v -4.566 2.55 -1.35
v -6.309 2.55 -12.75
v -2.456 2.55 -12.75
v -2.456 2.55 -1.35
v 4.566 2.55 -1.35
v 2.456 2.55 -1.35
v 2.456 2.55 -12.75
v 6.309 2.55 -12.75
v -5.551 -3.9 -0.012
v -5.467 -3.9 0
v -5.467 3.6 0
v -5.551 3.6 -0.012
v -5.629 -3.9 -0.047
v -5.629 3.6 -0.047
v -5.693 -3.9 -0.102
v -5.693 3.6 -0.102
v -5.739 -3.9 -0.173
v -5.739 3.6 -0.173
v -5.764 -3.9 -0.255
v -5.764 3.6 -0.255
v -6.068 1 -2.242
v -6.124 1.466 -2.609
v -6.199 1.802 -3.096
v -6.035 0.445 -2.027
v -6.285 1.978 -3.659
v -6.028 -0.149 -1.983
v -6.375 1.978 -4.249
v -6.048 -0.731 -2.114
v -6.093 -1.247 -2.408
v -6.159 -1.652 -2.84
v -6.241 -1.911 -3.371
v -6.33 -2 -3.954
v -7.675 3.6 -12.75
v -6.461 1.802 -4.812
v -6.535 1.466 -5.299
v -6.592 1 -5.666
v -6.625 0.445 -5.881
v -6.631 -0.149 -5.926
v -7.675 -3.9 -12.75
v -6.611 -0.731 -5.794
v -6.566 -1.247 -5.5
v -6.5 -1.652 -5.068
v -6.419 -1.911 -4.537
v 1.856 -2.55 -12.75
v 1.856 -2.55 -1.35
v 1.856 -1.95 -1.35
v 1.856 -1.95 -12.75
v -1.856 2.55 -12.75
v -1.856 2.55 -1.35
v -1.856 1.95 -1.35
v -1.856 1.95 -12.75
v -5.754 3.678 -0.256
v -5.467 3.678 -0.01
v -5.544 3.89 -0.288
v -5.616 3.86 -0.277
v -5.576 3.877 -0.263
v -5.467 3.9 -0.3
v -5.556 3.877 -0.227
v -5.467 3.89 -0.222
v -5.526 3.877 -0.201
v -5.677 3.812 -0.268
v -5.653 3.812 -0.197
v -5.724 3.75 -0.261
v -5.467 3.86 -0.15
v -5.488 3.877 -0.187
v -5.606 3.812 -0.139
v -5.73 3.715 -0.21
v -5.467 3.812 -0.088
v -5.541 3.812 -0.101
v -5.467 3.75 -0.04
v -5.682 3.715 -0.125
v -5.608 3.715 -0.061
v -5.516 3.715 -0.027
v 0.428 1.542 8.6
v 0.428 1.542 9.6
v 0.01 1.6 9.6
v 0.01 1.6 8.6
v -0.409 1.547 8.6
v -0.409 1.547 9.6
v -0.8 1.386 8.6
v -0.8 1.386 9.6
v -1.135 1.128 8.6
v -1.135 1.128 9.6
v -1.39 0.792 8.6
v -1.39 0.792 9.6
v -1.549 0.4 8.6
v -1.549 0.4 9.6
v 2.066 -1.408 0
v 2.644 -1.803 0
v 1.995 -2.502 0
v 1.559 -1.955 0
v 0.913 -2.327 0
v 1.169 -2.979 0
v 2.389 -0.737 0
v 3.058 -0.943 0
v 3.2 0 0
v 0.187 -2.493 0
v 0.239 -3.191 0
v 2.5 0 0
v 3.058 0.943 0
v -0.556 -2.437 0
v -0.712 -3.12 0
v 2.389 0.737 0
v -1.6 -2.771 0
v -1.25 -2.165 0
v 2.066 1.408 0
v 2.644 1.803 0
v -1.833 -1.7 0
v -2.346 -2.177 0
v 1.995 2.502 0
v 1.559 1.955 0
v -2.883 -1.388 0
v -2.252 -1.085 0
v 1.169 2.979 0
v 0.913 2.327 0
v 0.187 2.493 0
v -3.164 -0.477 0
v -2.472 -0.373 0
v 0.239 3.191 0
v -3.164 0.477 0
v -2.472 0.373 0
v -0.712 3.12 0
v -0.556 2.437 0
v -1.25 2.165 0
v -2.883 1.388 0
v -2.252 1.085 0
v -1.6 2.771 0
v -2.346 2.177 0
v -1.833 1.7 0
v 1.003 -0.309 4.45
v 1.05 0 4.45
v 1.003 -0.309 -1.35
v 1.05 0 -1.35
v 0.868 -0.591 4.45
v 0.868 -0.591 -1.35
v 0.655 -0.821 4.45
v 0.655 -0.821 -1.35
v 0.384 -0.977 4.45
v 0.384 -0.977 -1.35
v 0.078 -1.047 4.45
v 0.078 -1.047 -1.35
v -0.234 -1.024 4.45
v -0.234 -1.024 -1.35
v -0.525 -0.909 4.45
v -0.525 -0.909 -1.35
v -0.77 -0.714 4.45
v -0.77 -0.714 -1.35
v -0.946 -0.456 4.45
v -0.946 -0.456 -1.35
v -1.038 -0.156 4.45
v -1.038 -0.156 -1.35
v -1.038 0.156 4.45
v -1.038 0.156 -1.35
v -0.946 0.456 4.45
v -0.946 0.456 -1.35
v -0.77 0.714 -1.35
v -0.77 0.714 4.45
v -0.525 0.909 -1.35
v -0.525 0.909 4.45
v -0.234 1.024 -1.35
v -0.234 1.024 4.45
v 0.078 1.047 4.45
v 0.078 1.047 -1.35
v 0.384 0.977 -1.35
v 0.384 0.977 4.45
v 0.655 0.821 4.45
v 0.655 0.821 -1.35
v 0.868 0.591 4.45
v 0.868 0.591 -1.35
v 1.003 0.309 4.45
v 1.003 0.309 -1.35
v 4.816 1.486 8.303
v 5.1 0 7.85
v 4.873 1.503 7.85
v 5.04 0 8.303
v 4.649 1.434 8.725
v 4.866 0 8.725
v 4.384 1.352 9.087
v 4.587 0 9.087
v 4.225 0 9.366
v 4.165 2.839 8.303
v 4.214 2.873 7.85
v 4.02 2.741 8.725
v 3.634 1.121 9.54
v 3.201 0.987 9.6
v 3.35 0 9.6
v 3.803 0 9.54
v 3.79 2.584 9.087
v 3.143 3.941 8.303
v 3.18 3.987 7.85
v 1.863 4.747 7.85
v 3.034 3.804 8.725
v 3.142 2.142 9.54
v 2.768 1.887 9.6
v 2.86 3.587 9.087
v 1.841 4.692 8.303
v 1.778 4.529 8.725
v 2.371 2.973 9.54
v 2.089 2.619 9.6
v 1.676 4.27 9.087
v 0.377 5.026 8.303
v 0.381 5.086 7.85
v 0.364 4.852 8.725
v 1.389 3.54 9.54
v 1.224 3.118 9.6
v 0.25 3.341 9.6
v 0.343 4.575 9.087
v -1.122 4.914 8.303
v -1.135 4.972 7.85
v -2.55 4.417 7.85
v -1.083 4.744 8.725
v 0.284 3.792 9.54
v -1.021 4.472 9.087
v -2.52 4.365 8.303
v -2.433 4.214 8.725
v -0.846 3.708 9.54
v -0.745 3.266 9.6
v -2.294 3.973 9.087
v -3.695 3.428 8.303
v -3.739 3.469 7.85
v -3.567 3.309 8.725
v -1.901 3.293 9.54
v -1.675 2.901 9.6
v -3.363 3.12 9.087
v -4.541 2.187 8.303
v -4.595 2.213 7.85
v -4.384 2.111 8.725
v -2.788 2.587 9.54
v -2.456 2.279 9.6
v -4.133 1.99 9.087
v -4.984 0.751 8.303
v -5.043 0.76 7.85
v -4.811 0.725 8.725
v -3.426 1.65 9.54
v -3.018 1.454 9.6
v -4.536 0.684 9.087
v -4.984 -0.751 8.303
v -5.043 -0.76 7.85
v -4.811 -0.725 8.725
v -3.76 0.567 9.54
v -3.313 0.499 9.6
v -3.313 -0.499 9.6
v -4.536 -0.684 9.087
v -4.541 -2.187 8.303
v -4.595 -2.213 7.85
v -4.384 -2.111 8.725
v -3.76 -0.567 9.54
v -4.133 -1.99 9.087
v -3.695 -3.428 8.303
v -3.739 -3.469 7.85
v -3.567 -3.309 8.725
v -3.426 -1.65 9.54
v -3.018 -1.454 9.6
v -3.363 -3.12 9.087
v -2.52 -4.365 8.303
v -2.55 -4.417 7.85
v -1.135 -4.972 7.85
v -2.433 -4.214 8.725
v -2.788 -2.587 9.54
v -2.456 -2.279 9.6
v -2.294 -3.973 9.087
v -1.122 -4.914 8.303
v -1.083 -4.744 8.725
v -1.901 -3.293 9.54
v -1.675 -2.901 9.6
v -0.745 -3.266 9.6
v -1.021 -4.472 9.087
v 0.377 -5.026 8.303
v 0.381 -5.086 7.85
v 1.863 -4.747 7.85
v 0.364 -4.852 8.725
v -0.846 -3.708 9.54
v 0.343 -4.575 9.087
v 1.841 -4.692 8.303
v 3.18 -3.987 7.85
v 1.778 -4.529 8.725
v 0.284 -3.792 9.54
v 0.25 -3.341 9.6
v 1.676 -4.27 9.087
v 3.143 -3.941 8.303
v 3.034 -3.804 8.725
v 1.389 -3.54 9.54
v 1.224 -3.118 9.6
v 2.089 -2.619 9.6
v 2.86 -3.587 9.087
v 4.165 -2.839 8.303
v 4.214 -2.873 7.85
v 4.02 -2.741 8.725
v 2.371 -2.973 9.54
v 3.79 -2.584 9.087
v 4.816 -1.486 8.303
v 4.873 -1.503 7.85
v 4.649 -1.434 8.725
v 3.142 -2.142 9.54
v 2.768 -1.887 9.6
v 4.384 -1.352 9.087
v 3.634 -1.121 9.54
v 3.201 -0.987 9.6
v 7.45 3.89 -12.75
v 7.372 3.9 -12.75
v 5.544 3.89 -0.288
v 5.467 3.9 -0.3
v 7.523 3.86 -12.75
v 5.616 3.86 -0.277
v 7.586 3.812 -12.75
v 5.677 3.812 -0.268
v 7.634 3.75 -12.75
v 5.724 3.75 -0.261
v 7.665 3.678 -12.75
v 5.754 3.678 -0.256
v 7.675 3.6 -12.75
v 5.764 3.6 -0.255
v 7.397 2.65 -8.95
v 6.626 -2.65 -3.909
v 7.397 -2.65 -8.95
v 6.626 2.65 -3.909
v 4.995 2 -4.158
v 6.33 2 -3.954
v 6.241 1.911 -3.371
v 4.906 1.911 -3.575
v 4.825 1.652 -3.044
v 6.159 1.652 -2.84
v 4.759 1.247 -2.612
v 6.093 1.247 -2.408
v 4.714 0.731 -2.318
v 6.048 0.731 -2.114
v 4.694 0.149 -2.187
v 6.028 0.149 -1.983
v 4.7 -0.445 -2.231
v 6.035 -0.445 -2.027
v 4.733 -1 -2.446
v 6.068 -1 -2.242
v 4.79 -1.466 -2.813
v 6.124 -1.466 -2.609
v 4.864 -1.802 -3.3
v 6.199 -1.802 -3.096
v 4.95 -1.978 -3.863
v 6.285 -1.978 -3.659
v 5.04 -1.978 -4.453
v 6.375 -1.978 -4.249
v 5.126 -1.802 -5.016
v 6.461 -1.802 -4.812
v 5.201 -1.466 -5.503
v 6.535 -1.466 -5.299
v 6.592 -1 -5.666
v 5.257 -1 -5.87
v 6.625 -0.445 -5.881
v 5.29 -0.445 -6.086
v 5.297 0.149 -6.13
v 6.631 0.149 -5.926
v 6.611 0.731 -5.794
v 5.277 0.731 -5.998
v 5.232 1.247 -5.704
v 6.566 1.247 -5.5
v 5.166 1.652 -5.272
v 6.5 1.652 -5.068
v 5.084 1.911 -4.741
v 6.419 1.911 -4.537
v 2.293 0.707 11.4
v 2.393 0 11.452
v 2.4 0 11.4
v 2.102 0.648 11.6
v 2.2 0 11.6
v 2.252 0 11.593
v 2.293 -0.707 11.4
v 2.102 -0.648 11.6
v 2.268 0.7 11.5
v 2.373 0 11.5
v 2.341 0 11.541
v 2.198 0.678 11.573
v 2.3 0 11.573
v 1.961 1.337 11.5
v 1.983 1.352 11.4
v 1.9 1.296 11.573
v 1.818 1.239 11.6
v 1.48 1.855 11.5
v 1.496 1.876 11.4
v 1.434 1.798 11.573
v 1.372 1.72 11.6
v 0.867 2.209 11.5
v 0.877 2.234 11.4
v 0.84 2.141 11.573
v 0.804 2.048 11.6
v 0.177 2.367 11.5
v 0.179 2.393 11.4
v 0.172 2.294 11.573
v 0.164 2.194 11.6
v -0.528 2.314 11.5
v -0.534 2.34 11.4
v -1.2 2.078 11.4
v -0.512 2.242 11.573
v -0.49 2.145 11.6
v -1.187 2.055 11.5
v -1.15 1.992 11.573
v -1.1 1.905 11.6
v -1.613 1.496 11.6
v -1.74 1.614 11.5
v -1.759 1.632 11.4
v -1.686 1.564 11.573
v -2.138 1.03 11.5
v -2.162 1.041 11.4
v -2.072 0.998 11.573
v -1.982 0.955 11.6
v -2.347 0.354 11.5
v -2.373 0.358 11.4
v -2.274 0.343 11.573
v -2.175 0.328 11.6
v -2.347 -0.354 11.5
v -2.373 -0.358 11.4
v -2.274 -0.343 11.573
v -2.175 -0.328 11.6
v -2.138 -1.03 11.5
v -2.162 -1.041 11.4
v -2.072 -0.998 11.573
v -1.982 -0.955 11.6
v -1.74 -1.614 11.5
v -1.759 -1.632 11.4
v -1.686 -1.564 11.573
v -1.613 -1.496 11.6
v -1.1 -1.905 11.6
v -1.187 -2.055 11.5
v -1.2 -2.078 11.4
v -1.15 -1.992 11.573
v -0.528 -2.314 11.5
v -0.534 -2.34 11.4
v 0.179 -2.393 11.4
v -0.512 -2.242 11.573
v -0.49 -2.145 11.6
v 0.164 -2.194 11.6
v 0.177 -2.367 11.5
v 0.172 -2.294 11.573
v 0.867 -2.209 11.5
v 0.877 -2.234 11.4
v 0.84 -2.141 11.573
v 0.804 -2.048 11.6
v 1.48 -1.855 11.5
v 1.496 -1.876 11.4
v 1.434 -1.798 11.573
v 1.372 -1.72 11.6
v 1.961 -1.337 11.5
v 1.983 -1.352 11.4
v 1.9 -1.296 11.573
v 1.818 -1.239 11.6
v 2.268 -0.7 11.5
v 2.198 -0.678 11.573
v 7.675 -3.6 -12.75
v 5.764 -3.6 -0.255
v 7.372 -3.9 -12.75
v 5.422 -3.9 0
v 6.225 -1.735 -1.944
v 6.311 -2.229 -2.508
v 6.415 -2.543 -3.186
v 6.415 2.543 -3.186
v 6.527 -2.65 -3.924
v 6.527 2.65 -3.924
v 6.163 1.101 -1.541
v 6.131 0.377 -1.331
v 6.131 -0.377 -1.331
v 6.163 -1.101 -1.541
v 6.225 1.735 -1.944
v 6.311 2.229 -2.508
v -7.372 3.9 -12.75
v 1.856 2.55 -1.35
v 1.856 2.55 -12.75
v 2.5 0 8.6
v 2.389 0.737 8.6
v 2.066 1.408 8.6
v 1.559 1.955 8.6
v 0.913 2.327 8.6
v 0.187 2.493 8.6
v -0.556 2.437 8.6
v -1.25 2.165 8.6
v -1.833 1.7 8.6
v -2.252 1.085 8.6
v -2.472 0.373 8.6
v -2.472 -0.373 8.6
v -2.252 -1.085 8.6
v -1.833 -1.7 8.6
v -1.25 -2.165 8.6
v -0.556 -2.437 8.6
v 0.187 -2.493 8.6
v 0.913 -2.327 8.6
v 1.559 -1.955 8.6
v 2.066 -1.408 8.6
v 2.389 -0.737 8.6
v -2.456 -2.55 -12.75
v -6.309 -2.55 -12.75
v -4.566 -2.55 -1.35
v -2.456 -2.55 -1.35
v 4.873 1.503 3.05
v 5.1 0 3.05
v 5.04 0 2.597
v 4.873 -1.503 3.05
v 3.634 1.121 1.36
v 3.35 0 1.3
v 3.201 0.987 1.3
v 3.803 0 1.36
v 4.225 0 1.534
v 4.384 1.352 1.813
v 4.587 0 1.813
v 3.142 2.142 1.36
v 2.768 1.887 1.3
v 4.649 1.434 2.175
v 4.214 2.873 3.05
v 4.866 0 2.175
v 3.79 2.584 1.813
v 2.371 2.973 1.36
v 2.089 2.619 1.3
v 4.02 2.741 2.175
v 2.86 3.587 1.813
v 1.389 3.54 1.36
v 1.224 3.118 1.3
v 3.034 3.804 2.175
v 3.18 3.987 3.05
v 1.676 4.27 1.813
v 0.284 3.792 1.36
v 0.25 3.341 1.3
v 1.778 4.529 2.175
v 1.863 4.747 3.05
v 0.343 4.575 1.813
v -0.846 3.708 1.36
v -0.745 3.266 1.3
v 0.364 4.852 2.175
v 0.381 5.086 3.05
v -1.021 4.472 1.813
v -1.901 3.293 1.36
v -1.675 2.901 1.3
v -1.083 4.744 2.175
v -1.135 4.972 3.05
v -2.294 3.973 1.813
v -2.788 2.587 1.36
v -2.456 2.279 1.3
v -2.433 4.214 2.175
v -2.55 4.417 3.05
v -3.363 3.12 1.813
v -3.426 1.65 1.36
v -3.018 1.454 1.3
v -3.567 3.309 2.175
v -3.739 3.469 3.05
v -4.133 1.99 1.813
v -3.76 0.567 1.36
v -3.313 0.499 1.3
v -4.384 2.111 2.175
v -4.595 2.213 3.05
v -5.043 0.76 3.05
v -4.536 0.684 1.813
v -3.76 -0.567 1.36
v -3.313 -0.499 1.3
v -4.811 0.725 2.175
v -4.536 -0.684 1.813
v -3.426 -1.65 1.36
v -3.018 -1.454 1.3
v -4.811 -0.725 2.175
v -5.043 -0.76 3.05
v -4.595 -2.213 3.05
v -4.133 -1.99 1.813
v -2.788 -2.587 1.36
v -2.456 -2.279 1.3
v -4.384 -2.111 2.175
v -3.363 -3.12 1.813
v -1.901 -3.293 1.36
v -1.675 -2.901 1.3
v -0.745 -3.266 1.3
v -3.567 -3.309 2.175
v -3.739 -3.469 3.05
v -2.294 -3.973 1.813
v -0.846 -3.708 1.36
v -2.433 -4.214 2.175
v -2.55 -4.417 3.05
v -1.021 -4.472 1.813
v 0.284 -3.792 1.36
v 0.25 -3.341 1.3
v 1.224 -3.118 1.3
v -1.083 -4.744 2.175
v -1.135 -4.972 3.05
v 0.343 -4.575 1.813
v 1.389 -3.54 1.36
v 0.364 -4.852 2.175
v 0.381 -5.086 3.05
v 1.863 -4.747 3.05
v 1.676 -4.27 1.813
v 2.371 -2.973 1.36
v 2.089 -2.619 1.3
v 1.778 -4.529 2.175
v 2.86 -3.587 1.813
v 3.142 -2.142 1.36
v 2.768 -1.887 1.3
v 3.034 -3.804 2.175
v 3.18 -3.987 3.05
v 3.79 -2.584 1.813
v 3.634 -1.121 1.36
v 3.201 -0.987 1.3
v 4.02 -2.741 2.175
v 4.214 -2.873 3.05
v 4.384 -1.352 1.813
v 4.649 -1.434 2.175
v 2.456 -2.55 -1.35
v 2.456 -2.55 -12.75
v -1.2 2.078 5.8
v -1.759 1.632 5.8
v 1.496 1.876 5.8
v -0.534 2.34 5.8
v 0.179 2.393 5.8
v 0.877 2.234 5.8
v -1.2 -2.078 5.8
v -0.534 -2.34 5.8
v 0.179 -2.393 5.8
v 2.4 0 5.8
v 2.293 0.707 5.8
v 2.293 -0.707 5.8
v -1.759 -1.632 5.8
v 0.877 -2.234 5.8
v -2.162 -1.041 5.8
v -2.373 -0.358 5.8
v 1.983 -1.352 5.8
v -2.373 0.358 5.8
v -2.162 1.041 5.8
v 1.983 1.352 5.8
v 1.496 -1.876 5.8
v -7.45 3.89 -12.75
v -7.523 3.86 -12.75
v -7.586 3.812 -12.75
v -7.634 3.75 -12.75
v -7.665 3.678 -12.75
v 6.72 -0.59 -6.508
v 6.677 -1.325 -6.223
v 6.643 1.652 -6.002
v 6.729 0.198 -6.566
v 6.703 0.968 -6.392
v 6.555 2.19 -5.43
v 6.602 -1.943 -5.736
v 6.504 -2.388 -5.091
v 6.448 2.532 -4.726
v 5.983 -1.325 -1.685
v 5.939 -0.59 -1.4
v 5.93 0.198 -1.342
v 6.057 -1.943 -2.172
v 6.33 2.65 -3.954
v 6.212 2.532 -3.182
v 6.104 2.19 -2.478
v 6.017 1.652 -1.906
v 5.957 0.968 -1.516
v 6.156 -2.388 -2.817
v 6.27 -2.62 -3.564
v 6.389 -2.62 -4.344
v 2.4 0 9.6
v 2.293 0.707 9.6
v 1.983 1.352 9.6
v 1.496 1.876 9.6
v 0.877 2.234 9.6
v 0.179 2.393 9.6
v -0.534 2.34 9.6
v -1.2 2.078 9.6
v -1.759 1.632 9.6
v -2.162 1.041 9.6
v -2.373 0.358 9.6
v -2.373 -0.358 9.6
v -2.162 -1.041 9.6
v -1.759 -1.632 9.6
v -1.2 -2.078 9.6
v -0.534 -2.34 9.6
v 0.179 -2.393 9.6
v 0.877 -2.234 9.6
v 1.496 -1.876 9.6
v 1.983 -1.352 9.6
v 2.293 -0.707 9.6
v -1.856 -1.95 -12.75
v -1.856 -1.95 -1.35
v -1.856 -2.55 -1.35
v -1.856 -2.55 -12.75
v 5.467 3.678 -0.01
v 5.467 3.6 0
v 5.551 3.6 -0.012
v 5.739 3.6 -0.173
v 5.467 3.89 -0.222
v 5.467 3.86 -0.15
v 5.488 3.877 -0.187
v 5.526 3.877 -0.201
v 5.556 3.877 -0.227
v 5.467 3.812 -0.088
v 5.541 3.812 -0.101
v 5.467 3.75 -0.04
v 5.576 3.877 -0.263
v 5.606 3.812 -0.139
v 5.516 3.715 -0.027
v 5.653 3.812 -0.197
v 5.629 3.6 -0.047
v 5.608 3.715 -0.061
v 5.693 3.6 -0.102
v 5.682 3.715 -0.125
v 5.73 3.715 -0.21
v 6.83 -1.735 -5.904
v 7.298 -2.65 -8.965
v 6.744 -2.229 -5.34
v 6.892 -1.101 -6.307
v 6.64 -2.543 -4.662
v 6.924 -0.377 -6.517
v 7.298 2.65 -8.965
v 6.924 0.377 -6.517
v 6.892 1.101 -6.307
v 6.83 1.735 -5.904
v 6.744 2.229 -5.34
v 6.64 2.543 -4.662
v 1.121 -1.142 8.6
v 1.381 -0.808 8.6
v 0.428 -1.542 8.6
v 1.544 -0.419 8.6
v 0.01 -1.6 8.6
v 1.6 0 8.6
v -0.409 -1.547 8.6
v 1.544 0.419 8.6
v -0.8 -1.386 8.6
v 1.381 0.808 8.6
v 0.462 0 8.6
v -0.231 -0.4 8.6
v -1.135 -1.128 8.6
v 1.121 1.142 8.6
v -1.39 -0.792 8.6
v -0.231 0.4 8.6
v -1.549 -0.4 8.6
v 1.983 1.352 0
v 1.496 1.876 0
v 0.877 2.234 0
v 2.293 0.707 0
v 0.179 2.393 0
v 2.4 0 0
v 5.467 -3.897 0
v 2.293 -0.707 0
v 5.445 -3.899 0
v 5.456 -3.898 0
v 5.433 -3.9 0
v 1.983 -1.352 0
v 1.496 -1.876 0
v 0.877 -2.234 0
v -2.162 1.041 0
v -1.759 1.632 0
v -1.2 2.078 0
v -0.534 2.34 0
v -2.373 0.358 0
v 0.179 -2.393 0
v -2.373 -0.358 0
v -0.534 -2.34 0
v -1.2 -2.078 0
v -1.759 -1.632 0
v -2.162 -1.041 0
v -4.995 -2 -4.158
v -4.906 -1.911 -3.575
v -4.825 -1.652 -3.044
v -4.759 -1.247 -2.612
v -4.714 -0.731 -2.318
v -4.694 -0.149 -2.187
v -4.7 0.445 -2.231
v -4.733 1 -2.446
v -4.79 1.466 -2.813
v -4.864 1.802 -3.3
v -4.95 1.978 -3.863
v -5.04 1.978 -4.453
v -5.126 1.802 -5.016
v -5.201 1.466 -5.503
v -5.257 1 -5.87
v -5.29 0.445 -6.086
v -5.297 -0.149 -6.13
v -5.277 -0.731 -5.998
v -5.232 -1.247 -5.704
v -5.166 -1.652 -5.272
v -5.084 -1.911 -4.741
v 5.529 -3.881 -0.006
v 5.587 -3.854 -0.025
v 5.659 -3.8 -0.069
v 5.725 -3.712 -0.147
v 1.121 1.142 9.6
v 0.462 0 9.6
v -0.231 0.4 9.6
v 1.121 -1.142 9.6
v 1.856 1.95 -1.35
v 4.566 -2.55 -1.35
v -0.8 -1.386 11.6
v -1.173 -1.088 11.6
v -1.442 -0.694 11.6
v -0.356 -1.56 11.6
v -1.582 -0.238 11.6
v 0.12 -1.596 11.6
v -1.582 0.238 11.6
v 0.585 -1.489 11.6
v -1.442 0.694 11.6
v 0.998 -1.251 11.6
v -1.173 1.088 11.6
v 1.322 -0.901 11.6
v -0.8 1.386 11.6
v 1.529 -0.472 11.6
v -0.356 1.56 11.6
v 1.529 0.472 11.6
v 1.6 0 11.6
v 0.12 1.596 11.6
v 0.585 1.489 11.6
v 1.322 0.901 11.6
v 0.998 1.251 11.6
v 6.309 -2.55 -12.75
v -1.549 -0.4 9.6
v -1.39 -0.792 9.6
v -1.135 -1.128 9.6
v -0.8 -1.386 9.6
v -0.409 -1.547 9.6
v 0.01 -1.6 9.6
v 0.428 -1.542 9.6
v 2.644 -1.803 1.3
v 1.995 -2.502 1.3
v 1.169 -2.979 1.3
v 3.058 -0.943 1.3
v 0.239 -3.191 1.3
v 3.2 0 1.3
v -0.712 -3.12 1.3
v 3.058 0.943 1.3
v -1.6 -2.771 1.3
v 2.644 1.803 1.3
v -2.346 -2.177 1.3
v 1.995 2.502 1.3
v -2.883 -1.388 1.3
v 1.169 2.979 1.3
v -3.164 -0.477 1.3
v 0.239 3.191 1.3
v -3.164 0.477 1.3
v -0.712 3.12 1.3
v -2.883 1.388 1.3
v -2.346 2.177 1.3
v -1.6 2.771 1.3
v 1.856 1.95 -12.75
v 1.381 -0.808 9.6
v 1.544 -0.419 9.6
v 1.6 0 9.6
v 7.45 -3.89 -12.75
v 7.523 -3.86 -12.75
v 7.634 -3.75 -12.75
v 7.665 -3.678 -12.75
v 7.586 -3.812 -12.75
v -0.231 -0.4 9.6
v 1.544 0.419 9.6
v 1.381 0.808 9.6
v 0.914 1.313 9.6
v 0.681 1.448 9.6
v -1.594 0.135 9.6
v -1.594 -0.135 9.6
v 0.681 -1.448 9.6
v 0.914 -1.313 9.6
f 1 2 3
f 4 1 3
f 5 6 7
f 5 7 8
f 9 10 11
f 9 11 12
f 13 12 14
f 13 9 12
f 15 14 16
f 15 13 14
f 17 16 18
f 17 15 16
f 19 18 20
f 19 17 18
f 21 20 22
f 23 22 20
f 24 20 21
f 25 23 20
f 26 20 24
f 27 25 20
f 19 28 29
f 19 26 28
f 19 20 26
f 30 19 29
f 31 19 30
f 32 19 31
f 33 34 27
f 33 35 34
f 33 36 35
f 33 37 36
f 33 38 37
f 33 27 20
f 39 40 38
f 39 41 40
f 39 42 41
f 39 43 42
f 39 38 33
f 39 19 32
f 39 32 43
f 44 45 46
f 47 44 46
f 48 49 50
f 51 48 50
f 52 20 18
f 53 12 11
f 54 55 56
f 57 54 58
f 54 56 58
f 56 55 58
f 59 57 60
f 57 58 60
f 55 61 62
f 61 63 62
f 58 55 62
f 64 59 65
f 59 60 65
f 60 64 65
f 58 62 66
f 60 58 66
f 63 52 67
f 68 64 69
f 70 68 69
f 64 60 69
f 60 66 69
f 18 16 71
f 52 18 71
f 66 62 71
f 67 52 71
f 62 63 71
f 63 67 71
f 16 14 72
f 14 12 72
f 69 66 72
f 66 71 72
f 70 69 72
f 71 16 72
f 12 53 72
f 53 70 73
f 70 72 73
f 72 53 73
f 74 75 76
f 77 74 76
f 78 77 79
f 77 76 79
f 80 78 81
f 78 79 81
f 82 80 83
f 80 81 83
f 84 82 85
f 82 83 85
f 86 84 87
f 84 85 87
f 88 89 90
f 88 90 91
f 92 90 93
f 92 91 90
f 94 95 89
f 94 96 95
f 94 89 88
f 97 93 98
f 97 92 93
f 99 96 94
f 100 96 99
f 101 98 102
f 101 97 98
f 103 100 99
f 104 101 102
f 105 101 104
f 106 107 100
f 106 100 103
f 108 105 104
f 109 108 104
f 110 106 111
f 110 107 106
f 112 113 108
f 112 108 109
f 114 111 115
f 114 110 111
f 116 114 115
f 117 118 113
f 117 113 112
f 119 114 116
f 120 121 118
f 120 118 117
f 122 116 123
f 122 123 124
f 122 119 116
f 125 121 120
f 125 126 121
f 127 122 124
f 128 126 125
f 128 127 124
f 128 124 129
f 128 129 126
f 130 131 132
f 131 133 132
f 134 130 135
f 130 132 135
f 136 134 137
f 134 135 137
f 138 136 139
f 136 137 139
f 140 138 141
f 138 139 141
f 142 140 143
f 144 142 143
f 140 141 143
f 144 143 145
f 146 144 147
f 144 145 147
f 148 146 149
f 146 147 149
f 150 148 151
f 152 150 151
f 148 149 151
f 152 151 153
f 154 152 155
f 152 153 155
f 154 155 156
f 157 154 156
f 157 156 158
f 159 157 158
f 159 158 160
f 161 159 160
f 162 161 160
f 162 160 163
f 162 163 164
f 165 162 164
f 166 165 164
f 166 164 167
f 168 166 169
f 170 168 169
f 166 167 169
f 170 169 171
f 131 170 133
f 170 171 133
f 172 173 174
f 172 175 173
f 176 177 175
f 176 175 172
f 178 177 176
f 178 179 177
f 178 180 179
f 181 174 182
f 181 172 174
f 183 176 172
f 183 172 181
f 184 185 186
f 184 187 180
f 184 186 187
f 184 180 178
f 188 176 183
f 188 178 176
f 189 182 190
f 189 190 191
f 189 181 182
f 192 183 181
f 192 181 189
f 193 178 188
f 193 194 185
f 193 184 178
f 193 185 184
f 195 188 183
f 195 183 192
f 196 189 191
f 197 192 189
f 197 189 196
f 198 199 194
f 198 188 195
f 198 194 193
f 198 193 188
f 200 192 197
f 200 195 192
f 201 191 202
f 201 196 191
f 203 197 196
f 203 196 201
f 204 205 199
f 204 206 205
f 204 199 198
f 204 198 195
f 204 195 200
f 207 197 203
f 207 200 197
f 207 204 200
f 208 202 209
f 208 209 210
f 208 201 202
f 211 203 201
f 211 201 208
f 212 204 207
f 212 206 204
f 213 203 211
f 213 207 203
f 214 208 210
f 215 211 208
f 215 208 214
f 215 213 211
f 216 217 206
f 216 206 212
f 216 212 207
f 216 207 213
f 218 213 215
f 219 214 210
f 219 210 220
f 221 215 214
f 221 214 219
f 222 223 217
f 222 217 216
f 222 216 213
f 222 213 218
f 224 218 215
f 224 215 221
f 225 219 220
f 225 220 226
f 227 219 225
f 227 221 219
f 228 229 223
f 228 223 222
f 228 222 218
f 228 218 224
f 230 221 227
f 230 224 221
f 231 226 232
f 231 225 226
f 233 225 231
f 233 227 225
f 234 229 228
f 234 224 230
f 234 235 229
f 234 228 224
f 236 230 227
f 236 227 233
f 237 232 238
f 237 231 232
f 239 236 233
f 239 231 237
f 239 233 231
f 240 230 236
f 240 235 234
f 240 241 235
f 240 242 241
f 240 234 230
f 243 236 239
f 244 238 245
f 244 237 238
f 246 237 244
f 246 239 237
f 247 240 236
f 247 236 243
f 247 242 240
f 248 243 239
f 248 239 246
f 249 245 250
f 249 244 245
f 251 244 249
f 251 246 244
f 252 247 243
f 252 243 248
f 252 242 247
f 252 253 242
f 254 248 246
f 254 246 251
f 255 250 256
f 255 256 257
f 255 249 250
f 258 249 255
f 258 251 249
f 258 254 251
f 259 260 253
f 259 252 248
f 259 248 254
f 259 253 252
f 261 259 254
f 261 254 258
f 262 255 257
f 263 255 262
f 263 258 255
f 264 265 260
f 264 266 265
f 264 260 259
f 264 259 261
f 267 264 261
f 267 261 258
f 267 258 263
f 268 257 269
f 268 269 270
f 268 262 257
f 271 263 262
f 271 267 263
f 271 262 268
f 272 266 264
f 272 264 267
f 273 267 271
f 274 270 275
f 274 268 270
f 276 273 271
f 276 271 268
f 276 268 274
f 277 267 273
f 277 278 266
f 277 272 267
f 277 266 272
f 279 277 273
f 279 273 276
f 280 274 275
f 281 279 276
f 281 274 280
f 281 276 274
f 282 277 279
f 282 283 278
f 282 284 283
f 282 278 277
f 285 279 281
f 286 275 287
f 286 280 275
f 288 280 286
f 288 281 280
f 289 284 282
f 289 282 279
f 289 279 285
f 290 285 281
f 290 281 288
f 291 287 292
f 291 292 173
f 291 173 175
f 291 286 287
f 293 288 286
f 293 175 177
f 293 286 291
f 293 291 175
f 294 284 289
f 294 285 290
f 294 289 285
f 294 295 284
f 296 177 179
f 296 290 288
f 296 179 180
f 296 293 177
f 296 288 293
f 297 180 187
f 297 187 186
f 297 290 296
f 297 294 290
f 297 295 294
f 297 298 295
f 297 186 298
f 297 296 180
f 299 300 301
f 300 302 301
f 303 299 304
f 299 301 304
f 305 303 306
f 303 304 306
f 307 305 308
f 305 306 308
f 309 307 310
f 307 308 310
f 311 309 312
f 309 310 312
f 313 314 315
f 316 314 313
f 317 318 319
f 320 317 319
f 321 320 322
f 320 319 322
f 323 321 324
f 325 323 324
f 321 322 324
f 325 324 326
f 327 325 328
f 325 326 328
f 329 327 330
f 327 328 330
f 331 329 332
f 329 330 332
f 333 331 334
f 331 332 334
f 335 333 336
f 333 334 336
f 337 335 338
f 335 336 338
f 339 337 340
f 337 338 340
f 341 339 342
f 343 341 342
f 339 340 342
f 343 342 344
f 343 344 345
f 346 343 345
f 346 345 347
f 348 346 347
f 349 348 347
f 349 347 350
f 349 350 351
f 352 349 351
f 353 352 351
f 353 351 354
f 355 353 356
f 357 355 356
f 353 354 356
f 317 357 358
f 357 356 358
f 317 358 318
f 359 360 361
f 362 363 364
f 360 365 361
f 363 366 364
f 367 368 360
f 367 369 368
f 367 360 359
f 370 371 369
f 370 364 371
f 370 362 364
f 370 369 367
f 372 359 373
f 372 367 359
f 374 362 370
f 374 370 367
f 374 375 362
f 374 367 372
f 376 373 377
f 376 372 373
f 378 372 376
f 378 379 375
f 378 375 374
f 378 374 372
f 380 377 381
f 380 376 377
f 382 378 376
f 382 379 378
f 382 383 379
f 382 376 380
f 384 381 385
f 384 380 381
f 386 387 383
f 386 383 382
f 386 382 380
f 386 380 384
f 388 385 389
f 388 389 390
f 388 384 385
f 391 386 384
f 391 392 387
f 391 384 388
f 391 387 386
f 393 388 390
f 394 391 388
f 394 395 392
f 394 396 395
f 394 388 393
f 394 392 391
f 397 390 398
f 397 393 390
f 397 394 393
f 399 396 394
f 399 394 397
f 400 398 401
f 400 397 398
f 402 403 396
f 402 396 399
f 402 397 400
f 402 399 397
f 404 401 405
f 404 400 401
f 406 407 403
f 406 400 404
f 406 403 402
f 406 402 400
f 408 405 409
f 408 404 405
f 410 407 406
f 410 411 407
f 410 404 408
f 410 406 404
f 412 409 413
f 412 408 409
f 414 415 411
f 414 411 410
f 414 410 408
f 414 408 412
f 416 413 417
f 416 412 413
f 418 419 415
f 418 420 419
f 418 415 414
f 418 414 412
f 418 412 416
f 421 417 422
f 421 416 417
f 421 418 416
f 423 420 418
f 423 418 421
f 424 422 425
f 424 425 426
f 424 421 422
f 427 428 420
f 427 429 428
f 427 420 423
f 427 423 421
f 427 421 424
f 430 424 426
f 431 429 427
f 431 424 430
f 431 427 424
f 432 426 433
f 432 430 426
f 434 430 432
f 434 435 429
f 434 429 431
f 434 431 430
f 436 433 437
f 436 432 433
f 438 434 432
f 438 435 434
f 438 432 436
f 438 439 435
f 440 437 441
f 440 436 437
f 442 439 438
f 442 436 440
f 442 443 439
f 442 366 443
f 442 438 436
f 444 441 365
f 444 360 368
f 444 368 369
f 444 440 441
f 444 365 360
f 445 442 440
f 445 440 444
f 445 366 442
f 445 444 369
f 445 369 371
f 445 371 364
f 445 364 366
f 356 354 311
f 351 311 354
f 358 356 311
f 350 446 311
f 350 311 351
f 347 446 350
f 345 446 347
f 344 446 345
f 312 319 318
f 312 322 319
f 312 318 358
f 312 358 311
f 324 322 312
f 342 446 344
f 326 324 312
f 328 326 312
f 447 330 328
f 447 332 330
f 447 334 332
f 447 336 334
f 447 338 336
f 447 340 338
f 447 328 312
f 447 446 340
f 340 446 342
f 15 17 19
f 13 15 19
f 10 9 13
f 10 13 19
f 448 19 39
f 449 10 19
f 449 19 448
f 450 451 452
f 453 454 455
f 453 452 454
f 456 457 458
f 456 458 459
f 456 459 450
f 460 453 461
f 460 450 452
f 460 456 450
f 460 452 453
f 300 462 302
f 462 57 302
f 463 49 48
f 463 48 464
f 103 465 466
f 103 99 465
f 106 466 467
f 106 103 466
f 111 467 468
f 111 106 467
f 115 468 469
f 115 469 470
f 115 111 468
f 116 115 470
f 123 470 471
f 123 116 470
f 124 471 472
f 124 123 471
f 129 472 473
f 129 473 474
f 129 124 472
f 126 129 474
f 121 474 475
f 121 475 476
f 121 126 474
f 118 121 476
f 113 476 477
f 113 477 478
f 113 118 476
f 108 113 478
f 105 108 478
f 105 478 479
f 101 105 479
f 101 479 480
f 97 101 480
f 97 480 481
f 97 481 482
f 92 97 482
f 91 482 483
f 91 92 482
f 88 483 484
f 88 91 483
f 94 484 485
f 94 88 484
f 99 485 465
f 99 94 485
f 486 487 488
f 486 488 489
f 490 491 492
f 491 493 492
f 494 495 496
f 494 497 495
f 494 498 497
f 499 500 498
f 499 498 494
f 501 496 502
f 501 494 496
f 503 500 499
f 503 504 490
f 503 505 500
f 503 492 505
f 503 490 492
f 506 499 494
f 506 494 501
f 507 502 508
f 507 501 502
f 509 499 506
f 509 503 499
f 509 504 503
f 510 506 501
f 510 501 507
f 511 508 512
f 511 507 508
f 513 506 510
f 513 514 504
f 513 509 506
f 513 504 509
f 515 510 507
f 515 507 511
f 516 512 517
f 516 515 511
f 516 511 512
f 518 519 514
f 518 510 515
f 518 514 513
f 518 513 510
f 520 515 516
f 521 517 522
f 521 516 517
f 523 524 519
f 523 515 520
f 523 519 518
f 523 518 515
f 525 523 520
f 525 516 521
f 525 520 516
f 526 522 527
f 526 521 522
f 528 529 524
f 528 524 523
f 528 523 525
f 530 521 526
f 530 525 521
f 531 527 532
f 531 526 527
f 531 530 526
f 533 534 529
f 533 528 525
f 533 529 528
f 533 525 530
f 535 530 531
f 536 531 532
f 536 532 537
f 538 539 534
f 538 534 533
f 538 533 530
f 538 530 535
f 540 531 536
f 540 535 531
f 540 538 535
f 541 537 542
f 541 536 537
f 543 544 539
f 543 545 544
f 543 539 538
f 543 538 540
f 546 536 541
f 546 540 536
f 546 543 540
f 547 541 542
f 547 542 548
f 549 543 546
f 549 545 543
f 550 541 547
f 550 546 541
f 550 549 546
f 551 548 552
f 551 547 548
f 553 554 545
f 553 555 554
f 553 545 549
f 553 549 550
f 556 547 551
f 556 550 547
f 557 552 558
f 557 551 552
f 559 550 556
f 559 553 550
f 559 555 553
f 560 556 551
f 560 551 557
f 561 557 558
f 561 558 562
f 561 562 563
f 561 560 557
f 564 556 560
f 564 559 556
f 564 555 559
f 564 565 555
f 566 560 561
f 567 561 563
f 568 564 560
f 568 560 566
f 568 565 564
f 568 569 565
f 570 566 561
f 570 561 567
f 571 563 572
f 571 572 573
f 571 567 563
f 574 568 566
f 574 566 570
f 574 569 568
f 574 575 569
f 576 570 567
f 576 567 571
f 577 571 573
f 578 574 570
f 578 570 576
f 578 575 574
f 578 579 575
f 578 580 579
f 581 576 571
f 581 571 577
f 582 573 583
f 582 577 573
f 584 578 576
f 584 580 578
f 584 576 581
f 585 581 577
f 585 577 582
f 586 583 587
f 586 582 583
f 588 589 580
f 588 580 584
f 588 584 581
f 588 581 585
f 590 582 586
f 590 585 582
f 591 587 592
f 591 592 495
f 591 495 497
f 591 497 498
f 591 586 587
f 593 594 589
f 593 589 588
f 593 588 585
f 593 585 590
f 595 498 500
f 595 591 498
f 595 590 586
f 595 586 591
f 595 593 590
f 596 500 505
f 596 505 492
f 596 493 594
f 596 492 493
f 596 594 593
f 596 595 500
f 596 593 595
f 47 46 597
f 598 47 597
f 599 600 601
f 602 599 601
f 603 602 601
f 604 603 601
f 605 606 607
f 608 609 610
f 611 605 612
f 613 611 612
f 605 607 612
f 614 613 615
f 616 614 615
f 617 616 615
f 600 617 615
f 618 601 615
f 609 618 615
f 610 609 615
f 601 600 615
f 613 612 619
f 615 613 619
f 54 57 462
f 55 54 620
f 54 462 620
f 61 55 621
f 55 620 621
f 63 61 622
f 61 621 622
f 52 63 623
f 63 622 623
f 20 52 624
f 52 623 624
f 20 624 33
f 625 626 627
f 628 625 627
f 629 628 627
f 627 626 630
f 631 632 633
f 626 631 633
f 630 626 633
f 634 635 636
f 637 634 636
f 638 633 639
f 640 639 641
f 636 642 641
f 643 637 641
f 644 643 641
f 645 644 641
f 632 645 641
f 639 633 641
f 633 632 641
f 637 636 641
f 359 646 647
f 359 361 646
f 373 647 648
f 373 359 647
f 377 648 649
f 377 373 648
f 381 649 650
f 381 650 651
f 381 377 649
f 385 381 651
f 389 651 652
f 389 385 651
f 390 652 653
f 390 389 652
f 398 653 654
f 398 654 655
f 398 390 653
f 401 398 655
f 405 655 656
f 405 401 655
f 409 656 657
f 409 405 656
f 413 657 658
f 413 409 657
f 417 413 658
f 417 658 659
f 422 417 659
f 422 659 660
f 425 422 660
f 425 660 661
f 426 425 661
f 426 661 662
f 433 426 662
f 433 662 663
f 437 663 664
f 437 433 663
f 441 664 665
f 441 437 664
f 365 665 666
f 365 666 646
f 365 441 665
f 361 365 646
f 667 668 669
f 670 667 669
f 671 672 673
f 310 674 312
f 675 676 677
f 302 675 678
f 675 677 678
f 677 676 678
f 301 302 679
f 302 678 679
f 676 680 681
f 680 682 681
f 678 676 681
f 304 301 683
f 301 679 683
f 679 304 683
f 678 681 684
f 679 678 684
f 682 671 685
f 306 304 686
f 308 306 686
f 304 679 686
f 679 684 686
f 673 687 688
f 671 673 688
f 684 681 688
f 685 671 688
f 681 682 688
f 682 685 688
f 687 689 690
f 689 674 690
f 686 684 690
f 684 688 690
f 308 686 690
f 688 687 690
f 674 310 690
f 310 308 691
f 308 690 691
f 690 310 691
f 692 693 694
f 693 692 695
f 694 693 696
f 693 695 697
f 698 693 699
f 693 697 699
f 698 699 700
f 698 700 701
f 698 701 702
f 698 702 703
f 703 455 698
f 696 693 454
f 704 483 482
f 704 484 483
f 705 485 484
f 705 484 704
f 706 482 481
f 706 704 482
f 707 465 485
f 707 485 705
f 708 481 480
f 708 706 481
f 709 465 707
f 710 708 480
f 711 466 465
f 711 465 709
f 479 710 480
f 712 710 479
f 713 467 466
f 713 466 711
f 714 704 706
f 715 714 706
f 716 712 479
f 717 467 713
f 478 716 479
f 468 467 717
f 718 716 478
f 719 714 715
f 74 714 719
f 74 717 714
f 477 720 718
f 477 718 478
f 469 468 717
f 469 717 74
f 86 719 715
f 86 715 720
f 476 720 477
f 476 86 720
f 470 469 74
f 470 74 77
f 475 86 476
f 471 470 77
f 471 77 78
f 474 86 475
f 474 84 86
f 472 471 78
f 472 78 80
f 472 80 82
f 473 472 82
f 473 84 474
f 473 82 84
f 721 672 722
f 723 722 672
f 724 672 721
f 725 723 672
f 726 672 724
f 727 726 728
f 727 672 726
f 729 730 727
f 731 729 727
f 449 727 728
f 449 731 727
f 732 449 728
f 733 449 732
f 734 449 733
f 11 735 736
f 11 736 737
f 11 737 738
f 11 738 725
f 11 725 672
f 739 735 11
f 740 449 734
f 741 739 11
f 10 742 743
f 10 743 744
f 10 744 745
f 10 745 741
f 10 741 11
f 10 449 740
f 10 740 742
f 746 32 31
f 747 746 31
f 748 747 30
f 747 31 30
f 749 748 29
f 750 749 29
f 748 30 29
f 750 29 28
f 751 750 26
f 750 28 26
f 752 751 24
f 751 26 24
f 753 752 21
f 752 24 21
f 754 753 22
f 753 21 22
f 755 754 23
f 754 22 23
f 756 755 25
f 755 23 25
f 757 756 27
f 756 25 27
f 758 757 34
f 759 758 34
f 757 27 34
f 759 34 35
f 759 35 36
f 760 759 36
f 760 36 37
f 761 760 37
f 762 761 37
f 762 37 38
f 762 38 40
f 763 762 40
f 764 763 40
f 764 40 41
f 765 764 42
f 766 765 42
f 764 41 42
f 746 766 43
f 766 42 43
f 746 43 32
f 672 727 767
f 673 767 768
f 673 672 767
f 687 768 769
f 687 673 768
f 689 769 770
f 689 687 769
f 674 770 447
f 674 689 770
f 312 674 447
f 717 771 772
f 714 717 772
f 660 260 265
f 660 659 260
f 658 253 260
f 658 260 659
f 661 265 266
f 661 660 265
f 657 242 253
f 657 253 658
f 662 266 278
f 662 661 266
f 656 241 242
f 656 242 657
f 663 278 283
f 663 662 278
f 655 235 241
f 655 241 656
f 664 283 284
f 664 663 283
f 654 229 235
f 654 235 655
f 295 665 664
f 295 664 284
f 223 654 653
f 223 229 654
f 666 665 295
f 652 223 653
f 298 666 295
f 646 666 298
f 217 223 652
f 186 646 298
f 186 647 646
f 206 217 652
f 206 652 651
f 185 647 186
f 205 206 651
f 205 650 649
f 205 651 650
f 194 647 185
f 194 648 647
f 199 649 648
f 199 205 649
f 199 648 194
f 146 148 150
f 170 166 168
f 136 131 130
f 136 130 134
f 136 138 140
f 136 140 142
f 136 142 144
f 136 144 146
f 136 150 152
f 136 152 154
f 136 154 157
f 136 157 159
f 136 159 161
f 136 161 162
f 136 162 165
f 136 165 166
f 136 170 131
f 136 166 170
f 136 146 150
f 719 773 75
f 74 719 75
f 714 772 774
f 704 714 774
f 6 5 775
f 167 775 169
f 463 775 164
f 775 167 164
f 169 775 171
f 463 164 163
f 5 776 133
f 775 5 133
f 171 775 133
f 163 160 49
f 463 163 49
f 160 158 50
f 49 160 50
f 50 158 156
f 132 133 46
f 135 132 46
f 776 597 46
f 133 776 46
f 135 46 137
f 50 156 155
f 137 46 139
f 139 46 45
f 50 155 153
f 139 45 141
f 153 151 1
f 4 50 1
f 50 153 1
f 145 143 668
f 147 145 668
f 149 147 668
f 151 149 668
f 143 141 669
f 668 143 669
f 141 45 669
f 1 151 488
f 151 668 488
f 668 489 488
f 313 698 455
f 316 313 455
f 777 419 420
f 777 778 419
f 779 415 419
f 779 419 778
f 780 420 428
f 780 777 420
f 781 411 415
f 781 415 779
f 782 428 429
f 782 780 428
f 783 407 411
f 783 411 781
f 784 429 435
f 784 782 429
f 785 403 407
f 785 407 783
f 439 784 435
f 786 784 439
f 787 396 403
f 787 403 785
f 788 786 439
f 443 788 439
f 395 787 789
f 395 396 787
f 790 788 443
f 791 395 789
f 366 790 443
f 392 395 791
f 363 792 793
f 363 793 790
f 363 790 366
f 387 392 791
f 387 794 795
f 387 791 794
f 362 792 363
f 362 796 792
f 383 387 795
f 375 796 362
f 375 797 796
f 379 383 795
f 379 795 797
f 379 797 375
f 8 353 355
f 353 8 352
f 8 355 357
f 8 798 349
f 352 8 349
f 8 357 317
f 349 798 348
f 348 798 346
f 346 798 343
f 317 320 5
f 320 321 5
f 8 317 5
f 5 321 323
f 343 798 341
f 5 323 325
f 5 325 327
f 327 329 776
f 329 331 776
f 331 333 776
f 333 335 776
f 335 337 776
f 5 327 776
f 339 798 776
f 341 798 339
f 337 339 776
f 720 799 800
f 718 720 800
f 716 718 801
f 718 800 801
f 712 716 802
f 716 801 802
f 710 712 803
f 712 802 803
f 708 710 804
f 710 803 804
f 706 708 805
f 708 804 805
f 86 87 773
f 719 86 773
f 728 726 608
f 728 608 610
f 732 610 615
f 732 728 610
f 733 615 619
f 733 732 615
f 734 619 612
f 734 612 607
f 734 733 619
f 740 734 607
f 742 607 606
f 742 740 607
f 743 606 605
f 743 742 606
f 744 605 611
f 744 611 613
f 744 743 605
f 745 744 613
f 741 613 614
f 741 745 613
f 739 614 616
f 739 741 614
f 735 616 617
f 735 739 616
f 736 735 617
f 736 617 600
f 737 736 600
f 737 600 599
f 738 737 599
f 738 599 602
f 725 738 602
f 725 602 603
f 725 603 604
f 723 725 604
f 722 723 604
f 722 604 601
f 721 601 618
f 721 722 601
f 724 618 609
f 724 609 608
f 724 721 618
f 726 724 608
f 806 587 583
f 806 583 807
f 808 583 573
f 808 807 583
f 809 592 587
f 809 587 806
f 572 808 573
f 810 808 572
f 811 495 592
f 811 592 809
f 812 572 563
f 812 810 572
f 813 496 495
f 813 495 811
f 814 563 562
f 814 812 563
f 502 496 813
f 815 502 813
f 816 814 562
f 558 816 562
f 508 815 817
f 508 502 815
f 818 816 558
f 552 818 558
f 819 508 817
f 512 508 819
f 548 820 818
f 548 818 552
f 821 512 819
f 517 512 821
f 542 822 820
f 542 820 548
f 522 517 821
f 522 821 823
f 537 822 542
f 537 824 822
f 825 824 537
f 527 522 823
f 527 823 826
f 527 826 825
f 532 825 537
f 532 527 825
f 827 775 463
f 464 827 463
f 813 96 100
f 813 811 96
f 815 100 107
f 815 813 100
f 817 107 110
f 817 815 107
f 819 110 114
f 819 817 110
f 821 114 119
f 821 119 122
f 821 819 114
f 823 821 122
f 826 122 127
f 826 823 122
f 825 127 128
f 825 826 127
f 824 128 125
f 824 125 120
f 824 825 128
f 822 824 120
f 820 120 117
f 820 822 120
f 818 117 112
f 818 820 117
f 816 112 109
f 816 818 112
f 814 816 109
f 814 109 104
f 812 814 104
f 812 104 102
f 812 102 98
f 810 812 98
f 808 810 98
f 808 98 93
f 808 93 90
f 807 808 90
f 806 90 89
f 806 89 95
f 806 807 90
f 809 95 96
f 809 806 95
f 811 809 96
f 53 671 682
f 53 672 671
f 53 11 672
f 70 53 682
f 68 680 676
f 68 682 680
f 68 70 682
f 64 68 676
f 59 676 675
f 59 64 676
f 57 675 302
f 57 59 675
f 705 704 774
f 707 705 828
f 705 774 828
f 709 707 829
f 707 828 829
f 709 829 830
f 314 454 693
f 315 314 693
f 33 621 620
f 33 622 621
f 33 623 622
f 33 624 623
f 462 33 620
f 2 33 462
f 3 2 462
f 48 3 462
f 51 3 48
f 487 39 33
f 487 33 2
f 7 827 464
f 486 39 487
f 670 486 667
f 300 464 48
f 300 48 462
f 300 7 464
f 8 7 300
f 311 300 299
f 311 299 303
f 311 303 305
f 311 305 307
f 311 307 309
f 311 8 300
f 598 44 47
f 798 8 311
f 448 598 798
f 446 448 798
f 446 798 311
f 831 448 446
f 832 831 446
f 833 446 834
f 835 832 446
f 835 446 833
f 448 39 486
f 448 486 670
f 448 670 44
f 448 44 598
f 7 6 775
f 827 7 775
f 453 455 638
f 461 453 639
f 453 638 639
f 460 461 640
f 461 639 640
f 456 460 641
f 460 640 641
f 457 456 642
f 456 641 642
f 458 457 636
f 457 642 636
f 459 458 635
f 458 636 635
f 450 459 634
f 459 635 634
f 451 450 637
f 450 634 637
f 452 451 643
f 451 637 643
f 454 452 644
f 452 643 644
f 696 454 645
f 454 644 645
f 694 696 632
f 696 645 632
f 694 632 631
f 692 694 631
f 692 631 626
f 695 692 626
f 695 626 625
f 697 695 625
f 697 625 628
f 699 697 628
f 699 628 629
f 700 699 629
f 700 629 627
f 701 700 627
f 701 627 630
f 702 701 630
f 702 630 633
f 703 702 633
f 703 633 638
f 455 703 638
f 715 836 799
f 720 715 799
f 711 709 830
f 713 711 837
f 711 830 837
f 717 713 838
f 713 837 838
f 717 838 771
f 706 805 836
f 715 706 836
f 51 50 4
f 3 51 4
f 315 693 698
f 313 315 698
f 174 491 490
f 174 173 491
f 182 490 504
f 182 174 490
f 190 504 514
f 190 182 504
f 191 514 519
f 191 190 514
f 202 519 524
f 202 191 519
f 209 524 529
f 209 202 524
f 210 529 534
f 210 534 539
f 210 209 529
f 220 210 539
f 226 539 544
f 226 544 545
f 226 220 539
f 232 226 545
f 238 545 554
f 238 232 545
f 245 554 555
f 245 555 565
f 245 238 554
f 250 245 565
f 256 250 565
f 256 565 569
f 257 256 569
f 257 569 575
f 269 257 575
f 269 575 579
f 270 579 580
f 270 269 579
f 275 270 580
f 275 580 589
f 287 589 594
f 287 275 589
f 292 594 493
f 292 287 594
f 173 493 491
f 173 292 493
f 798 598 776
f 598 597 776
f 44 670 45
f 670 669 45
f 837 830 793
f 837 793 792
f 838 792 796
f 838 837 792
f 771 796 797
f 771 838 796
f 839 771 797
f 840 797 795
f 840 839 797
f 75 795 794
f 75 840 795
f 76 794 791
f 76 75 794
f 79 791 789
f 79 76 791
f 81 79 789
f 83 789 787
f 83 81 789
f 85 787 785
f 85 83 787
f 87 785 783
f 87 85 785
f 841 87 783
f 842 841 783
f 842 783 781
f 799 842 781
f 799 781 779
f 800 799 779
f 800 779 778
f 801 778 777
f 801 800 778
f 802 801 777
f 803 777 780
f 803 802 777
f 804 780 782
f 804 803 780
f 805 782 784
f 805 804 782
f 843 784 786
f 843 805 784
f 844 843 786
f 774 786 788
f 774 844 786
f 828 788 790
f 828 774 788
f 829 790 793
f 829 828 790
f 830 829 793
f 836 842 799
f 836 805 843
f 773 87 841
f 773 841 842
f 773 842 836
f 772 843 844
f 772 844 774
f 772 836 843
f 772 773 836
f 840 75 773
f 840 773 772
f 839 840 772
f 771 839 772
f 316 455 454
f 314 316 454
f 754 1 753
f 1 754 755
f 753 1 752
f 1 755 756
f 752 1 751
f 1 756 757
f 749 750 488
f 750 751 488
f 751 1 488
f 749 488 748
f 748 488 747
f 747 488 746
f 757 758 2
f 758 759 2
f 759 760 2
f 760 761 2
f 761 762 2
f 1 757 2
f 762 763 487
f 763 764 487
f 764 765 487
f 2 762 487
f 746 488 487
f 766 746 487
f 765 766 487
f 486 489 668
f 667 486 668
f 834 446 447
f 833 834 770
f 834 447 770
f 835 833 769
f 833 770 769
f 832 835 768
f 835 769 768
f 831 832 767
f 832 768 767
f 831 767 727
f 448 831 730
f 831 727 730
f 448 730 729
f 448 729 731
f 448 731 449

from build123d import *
from build123d import SkipClean  # not in build123d's __all__

# Parameters (mm, degrees)
F3_DEPTH  = 25
F4_R      = 2.4
F5_DEPTH  = 5.8
F7_DEPTH  = 3.9
F8_T      = -1.35
F10_DEPTH = 11.4
F12_R     = 2
F13_DEPTH = 1.35
F11_R     = 2
F14_DEPTH = 1.35
F15_R     = 0.3
F16_R     = 2.65
F16_R_2   = 2
F17_DEPTH = 0.2
F19_DEPTH = 0.1


with BuildPart() as f1:
    # F0 (on Front) → F1 (revolve)
    with BuildSketch(Plane.XZ):
        with BuildLine():
            Line((2.5, 0), (3.2, 0))
            Line((3.2, 0), (3.2, 1.3))
            Line((3.2, 1.3), (3.35, 1.3))
            ThreePointArc((3.35, 1.3), (4.5874368671, 1.8125631329), (5.1, 3.05))
            Line((5.1, 3.05), (5.1, 7.85))
            ThreePointArc((5.1, 7.85), (4.5874368671, 9.0874368671), (3.35, 9.6))
            Line((3.35, 9.6), (2.4, 9.6))
            Line((2.4, 9.6), (2.4, 11.4))
            ThreePointArc((2.4, 11.4), (2.3414213562, 11.5414213562), (2.2, 11.6))
            Line((2.2, 11.6), (1.6, 11.6))
            Line((1.6, 11.6), (1.6, 9.6))
            Line((1.6, 9.6), (0, 9.6))
            Line((0, 9.6), (0, 8.6))
            Line((0, 8.6), (2.5, 8.6))
            Line((2.5, 8.6), (2.5, 0))
        make_face()
    revolve(axis=Axis((0, 0, 5.8), (0, 0, 1)))

    # F2 (on face) → F3 (cut)
    with BuildSketch(Plane.XY.offset(9.6)):
        with BuildLine():
            Line((-1.5491933385, 0.4), (-0.2309401077, 0.4))
            Line((-0.2309401077, 0.4), (0.4281865077, 1.5416407865))
            ThreePointArc((0.4281865077, 1.5416407865), (-0.8, 1.3856406461), (-1.5491933385, 0.4))
        make_face()
        with BuildLine():
            Line((1.1210068308, 1.1416407865), (0.4618802154, 0))
            Line((0.4618802154, 0), (1.1210068308, -1.1416407865))
            ThreePointArc((1.1210068308, -1.1416407865), (1.4754001032, -0.6190270878), (1.6, 0))
            ThreePointArc((1.6, 0), (1.4754001032, 0.6190270878), (1.1210068308, 1.1416407865))
        make_face()
        with BuildLine():
            Line((0.4281865077, -1.5416407865), (-0.2309401077, -0.4))
            Line((-0.2309401077, -0.4), (-1.5491933385, -0.4))
            ThreePointArc((-1.5491933385, -0.4), (-0.8, -1.3856406461), (0.4281865077, -1.5416407865))
        make_face()
    with SkipClean():  # cleaning this boolean's faces spoils the solid; the shape is the same uncleaned
        extrude(amount=-F3_DEPTH, mode=Mode.SUBTRACT)


with BuildPart() as f5:
    # F4 (on face) → F5 (new body)
    with BuildSketch(Plane(origin=(0, 0, 0), x_dir=(1, 0, 0), z_dir=(0, 0, -1))):
        Circle(F4_R)
    extrude(amount=-F5_DEPTH)

    # F6 (on Front) → F7 (join, symmetric)
    with BuildSketch(Plane.XZ):
        Polygon((5.725, 0), (-5.725, 0), (-7.675, -12.75), (7.675, -12.75), align=None)
    extrude(amount=F7_DEPTH, both=True)

    # F8
    f8_openings = [f5.faces().sort_by_distance(p)[0] for p in [
        (0, 0, -12.75),
    ]]
    offset(amount=F8_T, openings=f8_openings, kind=Kind.INTERSECTION)

    # F9 (on face) → F10 (join, through all)
    with BuildSketch(Plane(origin=(0, 0, -1.35), x_dir=(1, 0, 0), z_dir=(0, 0, -1))):
        Polygon((-1.856, 1.95), (-1.856, 2.55), (-2.456, 2.55), align=None)
        Polygon((2.456, 2.55), (1.856, 2.55), (1.856, 1.95), align=None)
        Polygon((-1.856, -1.95), (-2.456, -2.55), (-1.856, -2.55), align=None)
        Polygon((1.856, -2.55), (2.456, -2.55), (1.856, -1.95), align=None)
    extrude(amount=F10_DEPTH)

    # F12 (on face) → F13 (cut)
    with BuildSketch(Plane(origin=(-5.5941472816, 0, 0.8555754666), x_dir=(0, -1, 0), z_dir=(-0.9885057562, 0, 0.1511832333))):
        with Locations((0, -4.8655240106)):
            Circle(F12_R)
    extrude(amount=-F13_DEPTH, mode=Mode.SUBTRACT)

    # F11 (on face) → F14 (cut)
    with BuildSketch(Plane(origin=(5.5941472816, 0, 0.8555754666), x_dir=(0, 1, 0), z_dir=(0.9885057562, 0, 0.1511832333))):
        with Locations((0, -4.8655240106)):
            Circle(F11_R)
    extrude(amount=-F14_DEPTH, mode=Mode.SUBTRACT)

    # F15
    f15_edges = [f5.edges().sort_by_distance(p)[0] for p in [
        (-6.7, 3.9, -6.375),
        (0, 3.9, 0),
        (-5.725, 0, 0),
        (6.7, 3.9, -6.375),
        (5.725, 0, 0),
        (6.7, -3.9, -6.375),
    ]]
    fillet(f15_edges, radius=F15_R)


with BuildPart() as f17:
    # F16 (on face) → F17 (new body)
    with BuildSketch(Plane(origin=(5.5941472816, 0, 0.8555754666), x_dir=(0, 1, 0), z_dir=(0.9885057562, 0, 0.1511832333))):
        with Locations((0, -4.8655240106)):
            Circle(F16_R)
        with Locations((0, -4.8655240106)):
            Circle(F16_R_2, mode=Mode.SUBTRACT)
        with Locations((0, -4.8655240106)):
            Circle(F16_R_2)
    extrude(amount=F17_DEPTH)

    # F18 (on face) → F19 (join)
    with BuildSketch(Plane(origin=(5.7918484328, 0, 0.8858121133), x_dir=(0, 1, 0), z_dir=(0.9885057562, 0, 0.1511832333))):
        with BuildLine():
            Line((2.65, -9.9655240106), (2.65, -4.8655240106))
            ThreePointArc((2.65, -4.8655240106), (0, -7.5155240106), (-2.65, -4.8655240106))
            Line((-2.65, -4.8655240106), (-2.65, -9.9655240106))
            Line((-2.65, -9.9655240106), (2.65, -9.9655240106))
        make_face()
        with BuildLine():
            ThreePointArc((-2.65, -4.8655240106), (0, -7.5155240106), (2.65, -4.8655240106))
            Line((2.65, -4.8655240106), (0, -4.8655240106))
            Line((0, -4.8655240106), (-2.65, -4.8655240106))
        make_face()
    extrude(amount=F19_DEPTH)


solid = Compound([f1.part, f5.part, f17.part])
